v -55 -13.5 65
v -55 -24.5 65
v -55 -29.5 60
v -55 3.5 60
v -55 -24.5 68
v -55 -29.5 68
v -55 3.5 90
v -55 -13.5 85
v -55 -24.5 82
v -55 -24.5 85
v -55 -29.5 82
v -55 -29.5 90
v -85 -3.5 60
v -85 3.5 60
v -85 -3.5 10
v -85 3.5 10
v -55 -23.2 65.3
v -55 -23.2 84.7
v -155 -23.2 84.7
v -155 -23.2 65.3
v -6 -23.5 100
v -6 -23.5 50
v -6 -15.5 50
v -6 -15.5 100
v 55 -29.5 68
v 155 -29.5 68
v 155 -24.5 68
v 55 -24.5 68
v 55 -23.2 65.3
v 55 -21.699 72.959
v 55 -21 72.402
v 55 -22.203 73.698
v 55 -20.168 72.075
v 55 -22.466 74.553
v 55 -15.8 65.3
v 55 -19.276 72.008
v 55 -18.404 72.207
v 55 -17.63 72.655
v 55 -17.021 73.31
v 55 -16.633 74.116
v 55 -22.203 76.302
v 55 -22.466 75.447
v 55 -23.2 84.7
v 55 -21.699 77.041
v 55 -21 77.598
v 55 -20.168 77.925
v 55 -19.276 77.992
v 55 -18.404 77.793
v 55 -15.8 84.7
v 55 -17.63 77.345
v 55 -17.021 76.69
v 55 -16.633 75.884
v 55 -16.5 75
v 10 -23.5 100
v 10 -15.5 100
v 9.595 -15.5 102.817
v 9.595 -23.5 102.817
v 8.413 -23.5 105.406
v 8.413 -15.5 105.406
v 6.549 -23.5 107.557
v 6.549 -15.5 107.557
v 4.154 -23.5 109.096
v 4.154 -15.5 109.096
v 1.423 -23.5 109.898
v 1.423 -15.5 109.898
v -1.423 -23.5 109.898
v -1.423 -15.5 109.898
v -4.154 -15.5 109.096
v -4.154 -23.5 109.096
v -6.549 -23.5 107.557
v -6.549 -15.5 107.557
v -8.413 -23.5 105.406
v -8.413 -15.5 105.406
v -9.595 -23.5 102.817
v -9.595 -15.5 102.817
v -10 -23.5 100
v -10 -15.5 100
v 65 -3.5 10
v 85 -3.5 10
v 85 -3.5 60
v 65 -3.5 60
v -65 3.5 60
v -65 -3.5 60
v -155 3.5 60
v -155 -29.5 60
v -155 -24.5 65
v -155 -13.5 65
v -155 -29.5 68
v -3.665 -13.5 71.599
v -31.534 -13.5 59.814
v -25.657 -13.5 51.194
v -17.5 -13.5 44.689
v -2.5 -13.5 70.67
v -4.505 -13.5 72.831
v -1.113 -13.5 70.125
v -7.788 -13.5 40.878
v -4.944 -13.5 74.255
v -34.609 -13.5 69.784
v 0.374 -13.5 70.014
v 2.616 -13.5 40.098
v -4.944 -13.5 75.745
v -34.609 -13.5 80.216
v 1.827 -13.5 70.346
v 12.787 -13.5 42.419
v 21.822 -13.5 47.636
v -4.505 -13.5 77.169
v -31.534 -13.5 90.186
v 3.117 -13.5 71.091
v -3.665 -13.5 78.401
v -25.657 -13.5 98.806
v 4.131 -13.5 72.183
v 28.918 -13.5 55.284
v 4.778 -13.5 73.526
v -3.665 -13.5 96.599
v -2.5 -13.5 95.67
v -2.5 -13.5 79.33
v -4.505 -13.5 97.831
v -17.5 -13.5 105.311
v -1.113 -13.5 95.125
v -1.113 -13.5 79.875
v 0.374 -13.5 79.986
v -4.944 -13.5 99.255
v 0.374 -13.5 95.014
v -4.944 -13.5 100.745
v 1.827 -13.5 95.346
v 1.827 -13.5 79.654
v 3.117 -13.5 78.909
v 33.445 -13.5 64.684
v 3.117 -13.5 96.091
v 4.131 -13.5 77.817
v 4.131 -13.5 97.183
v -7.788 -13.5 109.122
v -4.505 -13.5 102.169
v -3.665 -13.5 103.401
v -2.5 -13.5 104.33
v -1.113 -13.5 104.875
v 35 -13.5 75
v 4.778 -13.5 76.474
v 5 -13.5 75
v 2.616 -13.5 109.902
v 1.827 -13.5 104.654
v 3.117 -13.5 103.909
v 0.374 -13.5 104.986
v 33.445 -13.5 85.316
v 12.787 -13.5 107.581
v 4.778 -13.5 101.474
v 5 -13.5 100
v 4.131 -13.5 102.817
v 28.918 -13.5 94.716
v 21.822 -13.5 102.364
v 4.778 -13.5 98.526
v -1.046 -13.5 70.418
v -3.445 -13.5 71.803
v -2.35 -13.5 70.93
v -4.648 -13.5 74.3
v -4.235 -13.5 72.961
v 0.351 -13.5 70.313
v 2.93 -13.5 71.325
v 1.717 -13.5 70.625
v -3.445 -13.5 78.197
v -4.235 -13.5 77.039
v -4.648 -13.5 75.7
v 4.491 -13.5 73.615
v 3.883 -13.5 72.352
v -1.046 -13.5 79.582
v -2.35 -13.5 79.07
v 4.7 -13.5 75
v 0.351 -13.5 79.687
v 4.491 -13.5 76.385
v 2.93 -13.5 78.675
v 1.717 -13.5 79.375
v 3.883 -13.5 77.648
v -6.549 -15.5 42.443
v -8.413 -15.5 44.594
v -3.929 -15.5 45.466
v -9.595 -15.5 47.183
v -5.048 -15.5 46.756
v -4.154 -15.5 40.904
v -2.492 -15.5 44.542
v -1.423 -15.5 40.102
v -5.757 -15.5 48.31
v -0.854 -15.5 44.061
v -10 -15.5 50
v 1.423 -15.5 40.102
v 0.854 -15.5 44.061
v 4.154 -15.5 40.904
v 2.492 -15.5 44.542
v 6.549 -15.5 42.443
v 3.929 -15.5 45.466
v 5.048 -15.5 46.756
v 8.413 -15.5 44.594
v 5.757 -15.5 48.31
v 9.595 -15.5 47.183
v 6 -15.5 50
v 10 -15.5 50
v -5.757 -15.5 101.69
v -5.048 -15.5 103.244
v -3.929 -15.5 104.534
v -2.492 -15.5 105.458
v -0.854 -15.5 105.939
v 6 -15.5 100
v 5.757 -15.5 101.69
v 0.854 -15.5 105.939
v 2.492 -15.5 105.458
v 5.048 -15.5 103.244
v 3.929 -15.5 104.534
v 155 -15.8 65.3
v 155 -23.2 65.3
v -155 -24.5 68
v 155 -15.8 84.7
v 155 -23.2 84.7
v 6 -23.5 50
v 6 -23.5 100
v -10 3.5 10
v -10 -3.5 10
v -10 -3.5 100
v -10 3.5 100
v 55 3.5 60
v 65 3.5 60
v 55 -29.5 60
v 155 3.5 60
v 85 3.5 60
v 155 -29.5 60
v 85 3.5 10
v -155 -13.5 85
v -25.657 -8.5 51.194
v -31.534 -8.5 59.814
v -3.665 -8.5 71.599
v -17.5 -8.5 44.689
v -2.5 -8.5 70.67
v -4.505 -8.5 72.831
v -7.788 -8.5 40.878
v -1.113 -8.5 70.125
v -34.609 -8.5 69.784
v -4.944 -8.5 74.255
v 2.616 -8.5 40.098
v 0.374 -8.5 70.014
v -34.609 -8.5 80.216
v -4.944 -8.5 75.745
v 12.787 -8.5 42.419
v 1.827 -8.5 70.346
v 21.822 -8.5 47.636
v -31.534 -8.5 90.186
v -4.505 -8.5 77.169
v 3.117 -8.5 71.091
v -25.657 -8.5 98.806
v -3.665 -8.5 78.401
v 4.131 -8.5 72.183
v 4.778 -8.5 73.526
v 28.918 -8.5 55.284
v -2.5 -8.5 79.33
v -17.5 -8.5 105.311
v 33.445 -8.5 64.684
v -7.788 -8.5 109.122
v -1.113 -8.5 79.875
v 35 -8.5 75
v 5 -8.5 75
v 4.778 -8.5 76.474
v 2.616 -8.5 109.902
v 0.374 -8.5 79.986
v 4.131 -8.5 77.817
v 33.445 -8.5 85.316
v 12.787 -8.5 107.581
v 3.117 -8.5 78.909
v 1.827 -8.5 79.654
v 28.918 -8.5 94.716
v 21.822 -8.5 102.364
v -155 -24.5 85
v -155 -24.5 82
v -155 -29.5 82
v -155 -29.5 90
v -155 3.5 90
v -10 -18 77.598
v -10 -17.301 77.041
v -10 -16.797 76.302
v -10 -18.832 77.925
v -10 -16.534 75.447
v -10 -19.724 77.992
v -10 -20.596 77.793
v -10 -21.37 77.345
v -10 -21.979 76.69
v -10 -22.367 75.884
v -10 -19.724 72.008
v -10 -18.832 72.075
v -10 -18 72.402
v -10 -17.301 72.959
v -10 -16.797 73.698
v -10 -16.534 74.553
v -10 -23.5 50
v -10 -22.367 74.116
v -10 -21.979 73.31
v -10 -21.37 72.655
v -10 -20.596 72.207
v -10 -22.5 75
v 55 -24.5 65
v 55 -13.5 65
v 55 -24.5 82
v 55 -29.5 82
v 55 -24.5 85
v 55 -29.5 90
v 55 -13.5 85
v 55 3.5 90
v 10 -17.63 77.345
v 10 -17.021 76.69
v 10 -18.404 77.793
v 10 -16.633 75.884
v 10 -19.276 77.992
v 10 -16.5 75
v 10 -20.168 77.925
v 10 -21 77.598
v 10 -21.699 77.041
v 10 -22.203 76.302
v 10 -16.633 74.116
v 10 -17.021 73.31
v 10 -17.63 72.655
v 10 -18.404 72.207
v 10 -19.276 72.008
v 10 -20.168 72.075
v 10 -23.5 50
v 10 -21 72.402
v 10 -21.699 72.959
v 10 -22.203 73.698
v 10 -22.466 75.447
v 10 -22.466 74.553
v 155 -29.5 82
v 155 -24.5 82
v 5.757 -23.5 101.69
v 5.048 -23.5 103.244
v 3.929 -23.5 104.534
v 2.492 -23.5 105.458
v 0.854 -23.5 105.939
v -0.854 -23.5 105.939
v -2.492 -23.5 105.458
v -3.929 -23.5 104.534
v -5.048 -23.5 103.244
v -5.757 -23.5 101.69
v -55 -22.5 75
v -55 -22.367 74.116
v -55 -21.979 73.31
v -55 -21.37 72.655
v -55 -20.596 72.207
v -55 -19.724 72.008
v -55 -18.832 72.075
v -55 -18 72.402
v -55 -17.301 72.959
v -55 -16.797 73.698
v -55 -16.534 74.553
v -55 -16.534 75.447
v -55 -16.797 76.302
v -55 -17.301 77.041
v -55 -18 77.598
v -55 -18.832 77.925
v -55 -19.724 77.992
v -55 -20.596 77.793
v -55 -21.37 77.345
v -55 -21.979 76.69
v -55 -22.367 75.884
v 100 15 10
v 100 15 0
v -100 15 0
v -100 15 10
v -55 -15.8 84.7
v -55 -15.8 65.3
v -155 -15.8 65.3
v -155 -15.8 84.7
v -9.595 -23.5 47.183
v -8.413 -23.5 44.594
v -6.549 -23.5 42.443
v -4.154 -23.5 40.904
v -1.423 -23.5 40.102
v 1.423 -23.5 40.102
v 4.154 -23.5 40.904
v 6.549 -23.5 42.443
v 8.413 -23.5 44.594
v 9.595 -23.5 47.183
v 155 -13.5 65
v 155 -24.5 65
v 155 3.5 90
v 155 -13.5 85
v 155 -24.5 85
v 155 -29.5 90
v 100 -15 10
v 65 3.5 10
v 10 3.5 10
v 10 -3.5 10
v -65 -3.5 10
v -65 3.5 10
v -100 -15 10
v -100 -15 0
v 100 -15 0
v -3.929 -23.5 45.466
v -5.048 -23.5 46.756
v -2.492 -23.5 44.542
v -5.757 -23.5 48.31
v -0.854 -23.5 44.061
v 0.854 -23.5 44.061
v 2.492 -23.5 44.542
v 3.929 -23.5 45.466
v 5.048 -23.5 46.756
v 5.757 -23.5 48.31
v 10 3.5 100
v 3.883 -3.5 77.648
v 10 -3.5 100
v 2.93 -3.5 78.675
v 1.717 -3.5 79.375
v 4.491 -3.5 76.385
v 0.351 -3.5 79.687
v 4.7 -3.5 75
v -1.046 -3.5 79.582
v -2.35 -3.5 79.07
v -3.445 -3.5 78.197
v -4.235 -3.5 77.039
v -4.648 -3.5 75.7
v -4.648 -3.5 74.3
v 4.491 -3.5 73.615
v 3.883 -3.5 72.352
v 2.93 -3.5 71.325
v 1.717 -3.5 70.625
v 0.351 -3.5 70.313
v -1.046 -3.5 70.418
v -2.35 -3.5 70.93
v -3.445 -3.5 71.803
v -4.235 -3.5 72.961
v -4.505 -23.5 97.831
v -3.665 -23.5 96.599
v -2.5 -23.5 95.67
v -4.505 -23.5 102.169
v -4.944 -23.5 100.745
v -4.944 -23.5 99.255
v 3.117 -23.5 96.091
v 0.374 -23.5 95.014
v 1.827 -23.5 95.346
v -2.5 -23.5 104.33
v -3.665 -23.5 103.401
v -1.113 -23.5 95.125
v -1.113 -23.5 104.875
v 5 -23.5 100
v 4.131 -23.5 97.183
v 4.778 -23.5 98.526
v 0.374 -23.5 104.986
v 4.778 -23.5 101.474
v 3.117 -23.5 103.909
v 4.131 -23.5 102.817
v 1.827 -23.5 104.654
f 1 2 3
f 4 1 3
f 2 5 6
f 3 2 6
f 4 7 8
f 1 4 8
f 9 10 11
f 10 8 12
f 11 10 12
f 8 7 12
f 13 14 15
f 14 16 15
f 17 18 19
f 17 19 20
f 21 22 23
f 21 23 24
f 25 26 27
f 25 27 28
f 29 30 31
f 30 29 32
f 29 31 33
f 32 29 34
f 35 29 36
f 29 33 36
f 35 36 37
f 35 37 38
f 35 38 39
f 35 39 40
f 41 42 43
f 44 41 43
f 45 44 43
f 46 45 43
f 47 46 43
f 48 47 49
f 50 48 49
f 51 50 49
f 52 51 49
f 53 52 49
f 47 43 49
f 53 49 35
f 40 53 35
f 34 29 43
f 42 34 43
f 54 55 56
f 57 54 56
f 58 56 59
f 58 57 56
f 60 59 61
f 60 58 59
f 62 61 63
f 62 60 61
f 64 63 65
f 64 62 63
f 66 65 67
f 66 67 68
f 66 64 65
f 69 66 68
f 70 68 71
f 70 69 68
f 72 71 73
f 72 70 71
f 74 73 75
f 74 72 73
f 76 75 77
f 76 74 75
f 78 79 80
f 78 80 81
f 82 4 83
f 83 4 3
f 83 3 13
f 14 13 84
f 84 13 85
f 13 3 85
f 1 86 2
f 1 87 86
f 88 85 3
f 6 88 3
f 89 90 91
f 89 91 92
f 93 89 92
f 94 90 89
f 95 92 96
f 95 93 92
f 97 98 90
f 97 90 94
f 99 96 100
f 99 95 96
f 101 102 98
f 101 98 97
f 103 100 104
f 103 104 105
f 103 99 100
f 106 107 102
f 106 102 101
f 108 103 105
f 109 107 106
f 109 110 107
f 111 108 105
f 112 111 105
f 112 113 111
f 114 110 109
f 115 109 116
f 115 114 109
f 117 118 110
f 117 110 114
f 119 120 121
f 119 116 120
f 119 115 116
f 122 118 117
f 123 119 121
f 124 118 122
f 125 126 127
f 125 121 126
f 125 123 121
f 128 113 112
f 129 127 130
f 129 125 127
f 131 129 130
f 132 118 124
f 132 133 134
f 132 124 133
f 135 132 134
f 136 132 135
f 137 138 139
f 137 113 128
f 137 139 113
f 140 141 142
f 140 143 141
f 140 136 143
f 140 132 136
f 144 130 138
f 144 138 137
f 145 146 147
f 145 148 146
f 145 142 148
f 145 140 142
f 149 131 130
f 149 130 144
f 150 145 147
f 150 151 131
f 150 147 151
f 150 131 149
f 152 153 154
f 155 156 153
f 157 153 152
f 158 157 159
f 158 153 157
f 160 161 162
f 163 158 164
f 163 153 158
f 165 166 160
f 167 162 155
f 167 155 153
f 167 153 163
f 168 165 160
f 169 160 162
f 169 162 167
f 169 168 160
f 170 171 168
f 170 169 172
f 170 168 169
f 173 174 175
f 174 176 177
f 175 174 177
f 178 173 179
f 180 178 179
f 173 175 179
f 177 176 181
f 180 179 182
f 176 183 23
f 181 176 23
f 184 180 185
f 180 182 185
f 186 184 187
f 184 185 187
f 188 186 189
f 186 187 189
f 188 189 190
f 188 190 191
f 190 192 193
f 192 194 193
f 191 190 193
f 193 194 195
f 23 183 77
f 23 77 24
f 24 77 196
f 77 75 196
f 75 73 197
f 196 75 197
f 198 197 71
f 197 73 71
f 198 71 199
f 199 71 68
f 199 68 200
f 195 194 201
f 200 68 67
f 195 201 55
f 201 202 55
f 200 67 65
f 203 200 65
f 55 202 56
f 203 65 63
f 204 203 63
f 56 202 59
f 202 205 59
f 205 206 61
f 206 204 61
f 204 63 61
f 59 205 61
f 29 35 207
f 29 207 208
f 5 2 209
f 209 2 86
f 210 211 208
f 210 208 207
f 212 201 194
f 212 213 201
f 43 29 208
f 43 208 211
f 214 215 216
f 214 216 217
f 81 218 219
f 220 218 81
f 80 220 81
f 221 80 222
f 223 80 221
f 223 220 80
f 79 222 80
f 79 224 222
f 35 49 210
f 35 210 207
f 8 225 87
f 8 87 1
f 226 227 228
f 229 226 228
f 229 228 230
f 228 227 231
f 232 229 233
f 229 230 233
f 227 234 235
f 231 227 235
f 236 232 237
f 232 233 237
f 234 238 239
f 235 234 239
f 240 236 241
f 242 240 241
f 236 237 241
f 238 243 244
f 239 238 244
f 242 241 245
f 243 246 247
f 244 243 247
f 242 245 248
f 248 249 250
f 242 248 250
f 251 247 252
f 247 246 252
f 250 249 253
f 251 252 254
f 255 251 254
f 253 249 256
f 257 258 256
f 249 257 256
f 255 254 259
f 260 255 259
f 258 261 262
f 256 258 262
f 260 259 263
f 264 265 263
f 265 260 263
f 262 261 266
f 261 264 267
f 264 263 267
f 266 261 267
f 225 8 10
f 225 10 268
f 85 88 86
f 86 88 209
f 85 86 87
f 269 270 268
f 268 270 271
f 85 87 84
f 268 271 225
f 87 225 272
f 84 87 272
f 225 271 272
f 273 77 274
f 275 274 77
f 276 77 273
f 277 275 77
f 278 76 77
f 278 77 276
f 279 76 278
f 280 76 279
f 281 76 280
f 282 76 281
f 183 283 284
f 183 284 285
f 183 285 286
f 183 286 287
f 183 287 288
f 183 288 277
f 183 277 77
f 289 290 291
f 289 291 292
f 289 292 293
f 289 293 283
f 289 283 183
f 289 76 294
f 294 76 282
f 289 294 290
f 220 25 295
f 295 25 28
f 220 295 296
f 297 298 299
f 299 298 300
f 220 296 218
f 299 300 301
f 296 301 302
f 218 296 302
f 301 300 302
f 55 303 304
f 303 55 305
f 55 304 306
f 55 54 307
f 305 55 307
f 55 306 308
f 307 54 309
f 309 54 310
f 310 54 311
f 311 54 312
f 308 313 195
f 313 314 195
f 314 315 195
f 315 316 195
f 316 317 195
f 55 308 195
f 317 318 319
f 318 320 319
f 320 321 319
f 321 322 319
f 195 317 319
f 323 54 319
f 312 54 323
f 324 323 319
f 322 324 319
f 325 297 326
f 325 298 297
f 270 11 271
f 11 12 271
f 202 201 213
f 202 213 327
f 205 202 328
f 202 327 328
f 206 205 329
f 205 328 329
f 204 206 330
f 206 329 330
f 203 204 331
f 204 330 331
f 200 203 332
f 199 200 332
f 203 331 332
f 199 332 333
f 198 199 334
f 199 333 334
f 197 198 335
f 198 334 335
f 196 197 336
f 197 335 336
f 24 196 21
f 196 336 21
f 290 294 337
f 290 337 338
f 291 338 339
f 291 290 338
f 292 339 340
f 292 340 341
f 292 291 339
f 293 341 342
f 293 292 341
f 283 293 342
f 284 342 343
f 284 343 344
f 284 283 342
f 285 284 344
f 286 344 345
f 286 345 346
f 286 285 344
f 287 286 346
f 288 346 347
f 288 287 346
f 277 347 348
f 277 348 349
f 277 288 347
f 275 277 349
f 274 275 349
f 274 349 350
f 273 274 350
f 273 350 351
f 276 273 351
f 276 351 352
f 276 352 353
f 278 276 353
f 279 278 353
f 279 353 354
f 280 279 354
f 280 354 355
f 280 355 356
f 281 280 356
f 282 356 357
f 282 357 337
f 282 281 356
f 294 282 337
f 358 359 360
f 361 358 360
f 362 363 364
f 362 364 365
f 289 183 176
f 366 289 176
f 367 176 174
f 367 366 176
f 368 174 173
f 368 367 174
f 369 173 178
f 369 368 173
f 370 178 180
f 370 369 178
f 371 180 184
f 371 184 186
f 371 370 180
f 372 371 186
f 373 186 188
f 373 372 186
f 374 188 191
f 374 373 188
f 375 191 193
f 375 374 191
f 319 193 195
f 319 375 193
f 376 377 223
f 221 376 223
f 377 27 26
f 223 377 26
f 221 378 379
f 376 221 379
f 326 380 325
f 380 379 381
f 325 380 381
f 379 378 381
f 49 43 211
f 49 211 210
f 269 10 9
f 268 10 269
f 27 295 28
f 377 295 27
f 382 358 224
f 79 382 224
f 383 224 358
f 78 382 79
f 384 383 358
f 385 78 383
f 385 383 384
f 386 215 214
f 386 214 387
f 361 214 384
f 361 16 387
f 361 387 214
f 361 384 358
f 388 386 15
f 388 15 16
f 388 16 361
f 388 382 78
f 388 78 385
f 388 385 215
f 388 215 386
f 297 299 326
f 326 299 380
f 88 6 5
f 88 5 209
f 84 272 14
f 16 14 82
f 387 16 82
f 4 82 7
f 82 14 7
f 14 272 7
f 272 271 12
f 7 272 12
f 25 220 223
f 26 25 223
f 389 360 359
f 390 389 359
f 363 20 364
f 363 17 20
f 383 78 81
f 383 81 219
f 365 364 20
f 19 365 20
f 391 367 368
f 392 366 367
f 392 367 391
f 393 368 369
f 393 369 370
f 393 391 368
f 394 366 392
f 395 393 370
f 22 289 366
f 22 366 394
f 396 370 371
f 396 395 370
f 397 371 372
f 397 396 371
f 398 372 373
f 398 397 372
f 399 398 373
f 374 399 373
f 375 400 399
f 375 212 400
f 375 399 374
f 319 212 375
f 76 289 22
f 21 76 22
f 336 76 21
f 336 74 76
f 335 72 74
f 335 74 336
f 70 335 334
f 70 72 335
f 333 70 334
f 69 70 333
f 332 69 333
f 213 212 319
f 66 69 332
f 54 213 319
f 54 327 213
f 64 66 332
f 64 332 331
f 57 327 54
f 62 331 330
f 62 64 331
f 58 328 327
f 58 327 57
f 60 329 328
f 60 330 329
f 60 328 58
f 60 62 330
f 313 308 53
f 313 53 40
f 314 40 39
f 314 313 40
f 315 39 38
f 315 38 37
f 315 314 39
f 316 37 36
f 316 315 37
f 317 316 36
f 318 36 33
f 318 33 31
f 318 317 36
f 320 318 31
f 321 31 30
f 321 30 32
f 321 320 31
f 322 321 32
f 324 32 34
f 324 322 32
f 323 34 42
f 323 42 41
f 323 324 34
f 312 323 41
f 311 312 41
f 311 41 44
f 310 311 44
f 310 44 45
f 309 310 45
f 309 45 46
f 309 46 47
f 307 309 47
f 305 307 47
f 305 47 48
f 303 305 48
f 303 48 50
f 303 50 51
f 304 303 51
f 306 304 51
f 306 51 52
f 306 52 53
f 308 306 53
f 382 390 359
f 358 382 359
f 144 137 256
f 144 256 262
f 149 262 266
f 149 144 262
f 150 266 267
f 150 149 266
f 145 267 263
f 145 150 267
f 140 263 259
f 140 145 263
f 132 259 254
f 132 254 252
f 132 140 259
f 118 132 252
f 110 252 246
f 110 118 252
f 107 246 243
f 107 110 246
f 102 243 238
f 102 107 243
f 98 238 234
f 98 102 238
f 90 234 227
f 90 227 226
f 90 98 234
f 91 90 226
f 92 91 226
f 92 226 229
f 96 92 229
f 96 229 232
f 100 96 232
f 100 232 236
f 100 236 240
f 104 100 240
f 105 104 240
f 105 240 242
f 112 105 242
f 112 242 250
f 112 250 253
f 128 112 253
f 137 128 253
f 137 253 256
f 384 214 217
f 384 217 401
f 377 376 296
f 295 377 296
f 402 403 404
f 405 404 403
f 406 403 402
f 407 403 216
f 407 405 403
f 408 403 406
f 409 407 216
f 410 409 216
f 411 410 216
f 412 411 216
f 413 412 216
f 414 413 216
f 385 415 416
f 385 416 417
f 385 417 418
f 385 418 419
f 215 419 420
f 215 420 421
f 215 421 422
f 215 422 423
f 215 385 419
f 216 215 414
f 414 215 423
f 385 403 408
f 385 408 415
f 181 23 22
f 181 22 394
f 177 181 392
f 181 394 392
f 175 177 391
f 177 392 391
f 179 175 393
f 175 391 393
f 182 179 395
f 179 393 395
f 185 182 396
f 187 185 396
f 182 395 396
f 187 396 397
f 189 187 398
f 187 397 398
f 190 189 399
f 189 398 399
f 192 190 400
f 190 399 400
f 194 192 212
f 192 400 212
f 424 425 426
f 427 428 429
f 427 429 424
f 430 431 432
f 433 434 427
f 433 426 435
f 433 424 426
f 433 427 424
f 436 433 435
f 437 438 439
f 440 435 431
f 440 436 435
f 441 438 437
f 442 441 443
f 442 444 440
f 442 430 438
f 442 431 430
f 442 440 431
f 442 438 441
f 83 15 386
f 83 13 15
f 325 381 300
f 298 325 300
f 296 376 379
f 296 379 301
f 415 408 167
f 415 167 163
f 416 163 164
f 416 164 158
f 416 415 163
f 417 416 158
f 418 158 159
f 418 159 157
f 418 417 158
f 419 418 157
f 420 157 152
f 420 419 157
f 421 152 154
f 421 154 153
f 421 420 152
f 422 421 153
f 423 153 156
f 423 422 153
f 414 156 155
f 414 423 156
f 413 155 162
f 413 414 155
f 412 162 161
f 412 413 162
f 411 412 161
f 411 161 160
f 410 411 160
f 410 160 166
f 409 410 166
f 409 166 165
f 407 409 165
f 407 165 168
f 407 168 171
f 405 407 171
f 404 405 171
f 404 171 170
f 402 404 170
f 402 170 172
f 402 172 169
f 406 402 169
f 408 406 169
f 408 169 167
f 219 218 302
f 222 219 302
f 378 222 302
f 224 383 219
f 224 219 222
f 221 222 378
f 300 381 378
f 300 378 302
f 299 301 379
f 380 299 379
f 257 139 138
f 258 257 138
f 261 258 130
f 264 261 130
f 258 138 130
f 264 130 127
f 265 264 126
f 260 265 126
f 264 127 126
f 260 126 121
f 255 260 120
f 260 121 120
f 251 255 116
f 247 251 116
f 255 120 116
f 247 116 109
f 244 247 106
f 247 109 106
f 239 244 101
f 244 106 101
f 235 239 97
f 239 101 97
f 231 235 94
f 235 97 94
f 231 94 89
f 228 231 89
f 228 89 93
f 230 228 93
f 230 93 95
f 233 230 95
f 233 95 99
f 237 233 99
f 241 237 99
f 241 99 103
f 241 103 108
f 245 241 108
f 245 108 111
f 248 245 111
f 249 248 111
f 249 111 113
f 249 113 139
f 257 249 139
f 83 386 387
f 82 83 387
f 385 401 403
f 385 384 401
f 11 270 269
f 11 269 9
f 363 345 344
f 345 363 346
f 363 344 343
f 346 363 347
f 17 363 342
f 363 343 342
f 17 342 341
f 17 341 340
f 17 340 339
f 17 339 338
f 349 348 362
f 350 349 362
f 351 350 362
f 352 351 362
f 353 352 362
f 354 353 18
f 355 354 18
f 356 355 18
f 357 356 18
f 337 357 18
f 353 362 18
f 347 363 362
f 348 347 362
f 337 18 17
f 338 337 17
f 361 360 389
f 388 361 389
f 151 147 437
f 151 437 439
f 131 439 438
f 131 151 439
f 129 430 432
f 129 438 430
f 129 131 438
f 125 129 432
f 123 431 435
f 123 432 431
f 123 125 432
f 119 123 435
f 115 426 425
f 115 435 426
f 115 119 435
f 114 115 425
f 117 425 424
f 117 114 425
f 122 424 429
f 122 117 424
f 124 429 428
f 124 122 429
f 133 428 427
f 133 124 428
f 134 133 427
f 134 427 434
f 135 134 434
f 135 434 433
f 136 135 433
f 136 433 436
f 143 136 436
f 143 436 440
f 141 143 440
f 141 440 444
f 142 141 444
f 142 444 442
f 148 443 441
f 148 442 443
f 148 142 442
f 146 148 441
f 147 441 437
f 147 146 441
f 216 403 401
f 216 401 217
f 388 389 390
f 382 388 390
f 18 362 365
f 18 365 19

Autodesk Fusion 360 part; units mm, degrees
sketch "holder base" plane through (0, 0, 0) normal (0, 0, 1) x (1, 0, 0) in component "Holder"
  line L0 (-100, -15) -> (100, -15)
  line L1 (100, -15) -> (100, 15)
  line L2 (100, 15) -> (-100, 15)
  line L3 (-100, 15) -> (-100, -15)
  line L4 (-100, -15) -> (100, 15) construction
  line L5 (100, -15) -> (-100, 15) construction
extrude "Extrude1" add sketch "holder base" along normal blind 10 makes body 1 in component "Holder"
sketch "crank holder base" plane through (0, 0, 10) normal (0, 0, 1) x (-1, 0, 0) in component "Holder"
  line L0 (100, -15) -> (100, 15)
  line L1 (100, 15) -> (-100, 15)
  line L2 (-100, 15) -> (-100, -15)
  line L3 (-100, -15) -> (100, -15)
  line L4 (-10, 3.5) -> (10, 3.5)
  line L5 (10, 3.5) -> (10, -3.5)
  line L6 (10, -3.5) -> (-10, -3.5)
  line L7 (-10, -3.5) -> (-10, 3.5)
  line L8 (-10, 3.5) -> (10, -3.5) construction
  line L9 (10, 3.5) -> (-10, -3.5) construction
  dimension "d3" = 20
  dimension "d4" = 7
extrude "Extrude2" add sketch "crank holder base" along normal blind 150 contours L4 L5 L6 L7 bodies 1 in component "Holder"
sketch "slider holder base" plane through (0, 0, 10) normal (0, 0, 1) x (-1, 0, 0) in component "Holder"
  line L0 (-10, -3.5) -> (-10, 3.5)
  line L1 (-10, 3.5) -> (10, 3.5)
  line L2 (10, 3.5) -> (10, -3.5)
  line L3 (10, -3.5) -> (-10, -3.5)
  line L4 (100, -15) -> (100, 15)
  line L5 (100, 15) -> (-100, 15)
  line L6 (-100, 15) -> (-100, -15)
  line L7 (-100, -15) -> (100, -15)
  line L8 (-85, 3.5) -> (-65, 3.5)
  line L9 (-65, 3.5) -> (-65, -3.5)
  line L10 (-65, -3.5) -> (-85, -3.5)
  line L11 (-85, -3.5) -> (-85, 3.5)
  line L12 (-85, 3.5) -> (-65, -3.5) construction
  line L13 (-65, 3.5) -> (-85, -3.5) construction
  line L14 (0, -15) -> (0, 15)
  line L15 (65, -3.5) -> (85, -3.5)
  line L16 (85, 3.5) -> (65, 3.5)
  line L17 (85, -3.5) -> (85, 3.5)
  line L18 (65, 3.5) -> (65, -3.5)
  point P0 (-75, 0)
  dimension "d7" = 20
  dimension "d8" = 7
extrude "Extrude3" add sketch "slider holder base" along normal blind 110 contours L8 L9 L10 L11 | L15 L16 L17 L18 bodies 1 in component "Holder"
sketch "crank holder" plane through (0, -3.5, 0) normal (0, -1, 0) x (1, 0, 0) in component "Holder"
  line L0 (-10, 10) -> (10, 10)
  line L1 (10, 10) -> (10, 160)
  line L2 (10, 160) -> (-10, 160)
  line L3 (-10, 160) -> (-10, 10)
  circle A0 centre (0, 135) radius 5
  dimension "d11" = 10
extrude "Extrude4" add sketch "crank holder" along normal blind 10 contours A0 bodies 1 in component "Holder"
sketch "crank" plane through (0, -13.5, 0) normal (0, -1, 0) x (1, 0, 0) in component "Crank"
  circle A0 centre (0, 135) radius 5
  circle A1 centre (0, 135) radius 35
  circle A2 centre (0, 160) radius 5
  dimension "d14" = 10
extrude "Extrude1'" add sketch "crank" against normal blind 5 separate body contours A1 | A2 makes body 2 in component "Crank"
move_face "OffsetFaces1" offset -0.3 1 faces at (-4.6985, -10.1667, 133.2899) on bodies 1 in component "Holder"
extrude "Extrude2'" add sketch "crank" along normal blind 10 contours A2 bodies 2 in component "Crank"
sketch "slider holder side" plane through (0, -3.5, 0) normal (0, -1, 0) x (1, 0, 0) in component "Holder"
  line L0 (-85, 10) -> (-65, 10)
  line L1 (-65, 10) -> (-65, 120)
  line L2 (-65, 120) -> (-85, 120)
  line L3 (-85, 120) -> (-85, 10)
  line L4 (-55, 120) -> (-155, 120)
  line L5 (-155, 120) -> (-155, 150)
  line L6 (-155, 150) -> (-55, 150)
  line L7 (-55, 150) -> (-55, 120)
  line L8 (0, 160) -> (0, 10)
  line L9 (155, 150) -> (55, 150)
  line L10 (55, 150) -> (55, 120)
  line L11 (55, 120) -> (155, 120)
  line L12 (155, 120) -> (155, 150)
  line L13 (-155, 150) -> (-55, 150)
  line L14 (-55, 150) -> (-55, 145)
  line L15 (-55, 145) -> (-155, 145)
  line L16 (-155, 145) -> (-155, 150)
  line L17 (-55, 120) -> (-155, 120)
  line L18 (-155, 120) -> (-155, 125)
  line L19 (-155, 125) -> (-55, 125)
  line L20 (-55, 125) -> (-55, 120)
  line L21 (55, 145) -> (155, 145)
  line L22 (155, 125) -> (55, 125)
  dimension "d20" = 100
  dimension "d21" = 30
  dimension "d24" = 5
  dimension "d25" = 5
extrude "Extrude5" add sketch "slider holder side" against normal blind 7 contours L2 L4 L5 L7 L17 L18 L19 L20 | L5 L7 L15 L19 | L5 L6 L7 L13 L14 L15 L16 | L9 L10 L12 L21 | L10 L12 L21 L22 | L10 L11 L12 L22 bodies 1 in component "Holder"
extrude "Extrude6" add sketch "slider holder side" along normal blind 20 contours L2 L4 L5 L7 L17 L18 L19 L20 | L5 L6 L7 L13 L14 L15 L16 | L9 L10 L12 L21 | L10 L11 L12 L22 bodies 1 in component "Holder"
sketch "slider center" plane through (0, -23.5, 0) normal (0, -1, 0) x (1, 0, 0) in component "Slider"
  circle A0 centre (0, 160) radius 5
  line L0 (0, 170) -> (0, 100)
  line L1 (-10, 160) -> (-10, 110)
  line L2 (0, 100) -> (0, 170) construction
  line L3 (10, 160) -> (10, 110)
  line L4 (-10, 135) -> (10, 135) construction
  arc A1 (-6, 110) -> (6, 110) centre (0, 110) ccw
  line L5 (6, 160) -> (6, 110)
  arc A2 (6, 160) -> (-6, 160) centre (0, 160) ccw
  line L6 (-6, 110) -> (-6, 160)
  arc A3 (-10, 110) -> (10, 110) centre (0, 110) ccw
  line L7 (10, 160) -> (10, 110)
  arc A4 (10, 160) -> (-10, 160) centre (0, 160) ccw
  line L8 (-10, 110) -> (-10, 160)
  dimension "d29" = 70
extrude "Extrude1''" add sketch "slider center" against normal blind 8 separate body contours L0 L1 A1 A2 L6 A3 A4 L8 | L0 L3 A1 L5 A2 A3 L7 A4 makes body 3
sketch "Sketch2" plane through (10, 0, 0) normal (1, 0, 0) x (0, 1, 0) in component "Slider"
  line L0 (-23.5, 160) -> (-23.5, 110)
  line L1 (-23.5, 110) -> (-15.5, 110)
  line L2 (-15.5, 110) -> (-15.5, 160)
  line L3 (-15.5, 160) -> (-23.5, 160)
copy_body "CutPasteBodies1" bodies 3 removing the originals makes body 4 in component "Slider"
sketch "slider right link" plane through (10, 0, 0) normal (1, 0, 0) x (0, 1, 0) in component "Slider"
  line L0 (-19.5, 160) -> (-19.5, 110) construction
  circle A0 centre (-19.5, 135) radius 3
  dimension "d34" = 6
extrude "Extrude1'''" add sketch "slider right link" along normal blind 45 bodies 4 in component "Slider"
sketch "slider left link" plane through (-10, 0, 0) normal (-1, 0, 0) x (0, -1, 0) in component "Slider"
  line L0 (23.5, 110) -> (23.5, 160)
  line L1 (23.5, 160) -> (15.5, 160)
  line L2 (15.5, 160) -> (15.5, 110)
  line L3 (15.5, 110) -> (23.5, 110)
  line L4 (19.5, 160) -> (19.5, 110) construction
  circle A0 centre (19.5, 135) radius 3
  dimension "d37" = 6
extrude "Extrude2''" add sketch "slider left link" along normal blind 45 contours A0 bodies 4 in component "Slider"
sketch "slider left" plane through (-55, 0, 0) normal (-1, 0, 0) x (0, -1, 0) in component "Slider"
  circle A0 centre (19.5, 135) radius 3
  line L0 (23.5, 125) -> (15.5, 125)
  line L1 (15.5, 125) -> (15.5, 145)
  line L2 (15.5, 145) -> (23.5, 145)
  line L3 (23.5, 145) -> (23.5, 125)
  line L4 (23.5, 125) -> (15.5, 145) construction
  line L5 (15.5, 125) -> (23.5, 145) construction
  point P0 (19.5, 135)
  dimension "d40" = 8
  dimension "d41" = 20
extrude "Extrude4'" add sketch "slider left" along normal blind 100 contours A0 | L0 L1 L2 L3 bodies 4 in component "Slider"
sketch "slider right" plane through (55, 0, 0) normal (1, 0, 0) x (0, 1, 0) in component "Slider"
  circle A0 centre (-19.5, 135) radius 3
  line L0 (-15.5, 125) -> (-23.5, 125)
  line L1 (-23.5, 125) -> (-23.5, 145)
  line L2 (-23.5, 145) -> (-15.5, 145)
  line L3 (-15.5, 145) -> (-15.5, 125)
  line L4 (-15.5, 125) -> (-23.5, 145) construction
  line L5 (-23.5, 125) -> (-15.5, 145) construction
  point P0 (-19.5, 135)
  dimension "d46" = 8
  dimension "d47" = 20
extrude "Extrude5'" add sketch "slider right" along normal blind 100 contours A0 | L0 L1 L2 L3 bodies 4 in component "Slider"
move_face "OffsetFaces1'" offset -0.3 4 faces at (88.3333, -23.5, 131.6667) (88.3333, -20.8333, 145) (88.3333, -15.5, 138.3333) (88.3333, -18.1667, 125) on bodies 4 in component "Slider"
move_face "OffsetFaces2" offset -0.3 4 faces at (-88.3333, -23.5, 138.3333) (-121.6667, -20.8333, 145) (-88.3333, -20.8333, 125) (-88.3333, -15.5, 131.6667) on bodies 4 in component "Slider"
extrude "Extrude7" add 1 faces at (-121.6667, -3.5, 131.6667) along direction (0, -1, 0) blind 10 on bodies 1 bodies 1 in component "Holder"
extrude "Extrude8" add 1 faces at (121.6667, -3.5, 131.6667) along direction (0, -1, 0) blind 10 on bodies 1 bodies 1 in component "Holder"
extrude "Extrude9" add 4 faces at (-121.6667, -23.5, 148.3333) (-121.6667, -23.5, 123.3333) (88.3333, -23.5, 148.3333) (88.3333, -23.5, 123.3333) along direction (0, -1, 0) blind 6 on bodies 1 bodies 1 in component "Holder"
sketch "slider rail right bottom" plane through (0, 0, 125) normal (0, 0, 1) x (-1, 0, 0) in component "Holder"
  line L0 (-155, 13.5) -> (-55, 13.5)
  line L1 (-55, 13.5) -> (-55, 29.5)
  line L2 (-55, 29.5) -> (-155, 29.5)
  line L3 (-155, 29.5) -> (-155, 13.5)
  line L4 (-155, 29.5) -> (-55, 29.5)
  line L5 (-55, 29.5) -> (-55, 24.5)
  line L6 (-55, 24.5) -> (-155, 24.5)
  line L7 (-155, 24.5) -> (-155, 29.5)
  dimension "d58" = 100
  dimension "d59" = 5
sketch "slider rail right top" plane through (0, 0, 145) normal (0, 0, -1) x (1, 0, 0) in component "Holder"
  line L0 (55, 13.5) -> (155, 13.5)
  line L1 (155, 13.5) -> (155, 29.5)
  line L2 (155, 29.5) -> (55, 29.5)
  line L3 (55, 29.5) -> (55, 13.5)
  line L4 (155, 29.5) -> (55, 29.5)
  line L5 (55, 29.5) -> (55, 24.5)
  line L6 (55, 24.5) -> (155, 24.5)
  line L7 (155, 24.5) -> (155, 29.5)
  dimension "d60" = 100
  dimension "d61" = 5
extrude "Extrude10" add sketch "slider rail right bottom" along normal blind 3 contours L1 L2 L3 L4 L5 L6 L7 bodies 1 in component "Holder"
extrude "Extrude11" add sketch "slider rail right top" along normal blind 3 contours L1 L2 L3 L4 L5 L6 L7 bodies 1 in component "Holder"
sketch "slider rail left bottom" plane through (0, 0, 125) normal (0, 0, 1) x (-1, 0, 0) in component "Holder"
  line L0 (55, 13.5) -> (155, 13.5)
  line L1 (155, 13.5) -> (155, 29.5)
  line L2 (155, 29.5) -> (55, 29.5)
  line L3 (55, 29.5) -> (55, 13.5)
  line L4 (155, 29.5) -> (55, 29.5)
  line L5 (55, 29.5) -> (55, 24.5)
  line L6 (55, 24.5) -> (155, 24.5)
  line L7 (155, 24.5) -> (155, 29.5)
  dimension "d66" = 100
  dimension "d67" = 5
sketch "slider rail left top" plane through (0, 0, 145) normal (0, 0, -1) x (1, 0, 0) in component "Holder"
  line L0 (-155, 13.5) -> (-55, 13.5)
  line L1 (-55, 13.5) -> (-55, 29.5)
  line L2 (-55, 29.5) -> (-155, 29.5)
  line L3 (-155, 29.5) -> (-155, 13.5)
  line L4 (-155, 29.5) -> (-55, 29.5)
  line L5 (-55, 29.5) -> (-55, 24.5)
  line L6 (-55, 24.5) -> (-155, 24.5)
  line L7 (-155, 24.5) -> (-155, 29.5)
  dimension "d68" = 100
  dimension "d69" = 5
extrude "Extrude12" add sketch "slider rail left bottom" along normal blind 3 contours L1 L2 L3 L4 L5 L6 L7 bodies 1 in component "Holder"
extrude "Extrude13" add sketch "slider rail left top" along normal blind 3 contours L1 L2 L3 L4 L5 L6 L7 bodies 1 in component "Holder"
extrude "Extrude14" add sketch "crank holder base" along normal blind 60 bodies 1 in component "Holder"
extrude "Extrude15" cut sketch "holder base" along normal blind 60 bodies 1 in component "Holder"
component "Holder" placed x (1, 0, 0) y (0, 1, 0) z (0, 0, 1) at (0, 0, -60)
component "Crank" placed x (1, 0, 0) y (0, 1, 0) z (0, 0, 1) at (0, 0, -60)
component "Slider" placed x (1, 0, 0) y (0, 1, 0) z (0, 0, 1) at (0, 0, -60)
